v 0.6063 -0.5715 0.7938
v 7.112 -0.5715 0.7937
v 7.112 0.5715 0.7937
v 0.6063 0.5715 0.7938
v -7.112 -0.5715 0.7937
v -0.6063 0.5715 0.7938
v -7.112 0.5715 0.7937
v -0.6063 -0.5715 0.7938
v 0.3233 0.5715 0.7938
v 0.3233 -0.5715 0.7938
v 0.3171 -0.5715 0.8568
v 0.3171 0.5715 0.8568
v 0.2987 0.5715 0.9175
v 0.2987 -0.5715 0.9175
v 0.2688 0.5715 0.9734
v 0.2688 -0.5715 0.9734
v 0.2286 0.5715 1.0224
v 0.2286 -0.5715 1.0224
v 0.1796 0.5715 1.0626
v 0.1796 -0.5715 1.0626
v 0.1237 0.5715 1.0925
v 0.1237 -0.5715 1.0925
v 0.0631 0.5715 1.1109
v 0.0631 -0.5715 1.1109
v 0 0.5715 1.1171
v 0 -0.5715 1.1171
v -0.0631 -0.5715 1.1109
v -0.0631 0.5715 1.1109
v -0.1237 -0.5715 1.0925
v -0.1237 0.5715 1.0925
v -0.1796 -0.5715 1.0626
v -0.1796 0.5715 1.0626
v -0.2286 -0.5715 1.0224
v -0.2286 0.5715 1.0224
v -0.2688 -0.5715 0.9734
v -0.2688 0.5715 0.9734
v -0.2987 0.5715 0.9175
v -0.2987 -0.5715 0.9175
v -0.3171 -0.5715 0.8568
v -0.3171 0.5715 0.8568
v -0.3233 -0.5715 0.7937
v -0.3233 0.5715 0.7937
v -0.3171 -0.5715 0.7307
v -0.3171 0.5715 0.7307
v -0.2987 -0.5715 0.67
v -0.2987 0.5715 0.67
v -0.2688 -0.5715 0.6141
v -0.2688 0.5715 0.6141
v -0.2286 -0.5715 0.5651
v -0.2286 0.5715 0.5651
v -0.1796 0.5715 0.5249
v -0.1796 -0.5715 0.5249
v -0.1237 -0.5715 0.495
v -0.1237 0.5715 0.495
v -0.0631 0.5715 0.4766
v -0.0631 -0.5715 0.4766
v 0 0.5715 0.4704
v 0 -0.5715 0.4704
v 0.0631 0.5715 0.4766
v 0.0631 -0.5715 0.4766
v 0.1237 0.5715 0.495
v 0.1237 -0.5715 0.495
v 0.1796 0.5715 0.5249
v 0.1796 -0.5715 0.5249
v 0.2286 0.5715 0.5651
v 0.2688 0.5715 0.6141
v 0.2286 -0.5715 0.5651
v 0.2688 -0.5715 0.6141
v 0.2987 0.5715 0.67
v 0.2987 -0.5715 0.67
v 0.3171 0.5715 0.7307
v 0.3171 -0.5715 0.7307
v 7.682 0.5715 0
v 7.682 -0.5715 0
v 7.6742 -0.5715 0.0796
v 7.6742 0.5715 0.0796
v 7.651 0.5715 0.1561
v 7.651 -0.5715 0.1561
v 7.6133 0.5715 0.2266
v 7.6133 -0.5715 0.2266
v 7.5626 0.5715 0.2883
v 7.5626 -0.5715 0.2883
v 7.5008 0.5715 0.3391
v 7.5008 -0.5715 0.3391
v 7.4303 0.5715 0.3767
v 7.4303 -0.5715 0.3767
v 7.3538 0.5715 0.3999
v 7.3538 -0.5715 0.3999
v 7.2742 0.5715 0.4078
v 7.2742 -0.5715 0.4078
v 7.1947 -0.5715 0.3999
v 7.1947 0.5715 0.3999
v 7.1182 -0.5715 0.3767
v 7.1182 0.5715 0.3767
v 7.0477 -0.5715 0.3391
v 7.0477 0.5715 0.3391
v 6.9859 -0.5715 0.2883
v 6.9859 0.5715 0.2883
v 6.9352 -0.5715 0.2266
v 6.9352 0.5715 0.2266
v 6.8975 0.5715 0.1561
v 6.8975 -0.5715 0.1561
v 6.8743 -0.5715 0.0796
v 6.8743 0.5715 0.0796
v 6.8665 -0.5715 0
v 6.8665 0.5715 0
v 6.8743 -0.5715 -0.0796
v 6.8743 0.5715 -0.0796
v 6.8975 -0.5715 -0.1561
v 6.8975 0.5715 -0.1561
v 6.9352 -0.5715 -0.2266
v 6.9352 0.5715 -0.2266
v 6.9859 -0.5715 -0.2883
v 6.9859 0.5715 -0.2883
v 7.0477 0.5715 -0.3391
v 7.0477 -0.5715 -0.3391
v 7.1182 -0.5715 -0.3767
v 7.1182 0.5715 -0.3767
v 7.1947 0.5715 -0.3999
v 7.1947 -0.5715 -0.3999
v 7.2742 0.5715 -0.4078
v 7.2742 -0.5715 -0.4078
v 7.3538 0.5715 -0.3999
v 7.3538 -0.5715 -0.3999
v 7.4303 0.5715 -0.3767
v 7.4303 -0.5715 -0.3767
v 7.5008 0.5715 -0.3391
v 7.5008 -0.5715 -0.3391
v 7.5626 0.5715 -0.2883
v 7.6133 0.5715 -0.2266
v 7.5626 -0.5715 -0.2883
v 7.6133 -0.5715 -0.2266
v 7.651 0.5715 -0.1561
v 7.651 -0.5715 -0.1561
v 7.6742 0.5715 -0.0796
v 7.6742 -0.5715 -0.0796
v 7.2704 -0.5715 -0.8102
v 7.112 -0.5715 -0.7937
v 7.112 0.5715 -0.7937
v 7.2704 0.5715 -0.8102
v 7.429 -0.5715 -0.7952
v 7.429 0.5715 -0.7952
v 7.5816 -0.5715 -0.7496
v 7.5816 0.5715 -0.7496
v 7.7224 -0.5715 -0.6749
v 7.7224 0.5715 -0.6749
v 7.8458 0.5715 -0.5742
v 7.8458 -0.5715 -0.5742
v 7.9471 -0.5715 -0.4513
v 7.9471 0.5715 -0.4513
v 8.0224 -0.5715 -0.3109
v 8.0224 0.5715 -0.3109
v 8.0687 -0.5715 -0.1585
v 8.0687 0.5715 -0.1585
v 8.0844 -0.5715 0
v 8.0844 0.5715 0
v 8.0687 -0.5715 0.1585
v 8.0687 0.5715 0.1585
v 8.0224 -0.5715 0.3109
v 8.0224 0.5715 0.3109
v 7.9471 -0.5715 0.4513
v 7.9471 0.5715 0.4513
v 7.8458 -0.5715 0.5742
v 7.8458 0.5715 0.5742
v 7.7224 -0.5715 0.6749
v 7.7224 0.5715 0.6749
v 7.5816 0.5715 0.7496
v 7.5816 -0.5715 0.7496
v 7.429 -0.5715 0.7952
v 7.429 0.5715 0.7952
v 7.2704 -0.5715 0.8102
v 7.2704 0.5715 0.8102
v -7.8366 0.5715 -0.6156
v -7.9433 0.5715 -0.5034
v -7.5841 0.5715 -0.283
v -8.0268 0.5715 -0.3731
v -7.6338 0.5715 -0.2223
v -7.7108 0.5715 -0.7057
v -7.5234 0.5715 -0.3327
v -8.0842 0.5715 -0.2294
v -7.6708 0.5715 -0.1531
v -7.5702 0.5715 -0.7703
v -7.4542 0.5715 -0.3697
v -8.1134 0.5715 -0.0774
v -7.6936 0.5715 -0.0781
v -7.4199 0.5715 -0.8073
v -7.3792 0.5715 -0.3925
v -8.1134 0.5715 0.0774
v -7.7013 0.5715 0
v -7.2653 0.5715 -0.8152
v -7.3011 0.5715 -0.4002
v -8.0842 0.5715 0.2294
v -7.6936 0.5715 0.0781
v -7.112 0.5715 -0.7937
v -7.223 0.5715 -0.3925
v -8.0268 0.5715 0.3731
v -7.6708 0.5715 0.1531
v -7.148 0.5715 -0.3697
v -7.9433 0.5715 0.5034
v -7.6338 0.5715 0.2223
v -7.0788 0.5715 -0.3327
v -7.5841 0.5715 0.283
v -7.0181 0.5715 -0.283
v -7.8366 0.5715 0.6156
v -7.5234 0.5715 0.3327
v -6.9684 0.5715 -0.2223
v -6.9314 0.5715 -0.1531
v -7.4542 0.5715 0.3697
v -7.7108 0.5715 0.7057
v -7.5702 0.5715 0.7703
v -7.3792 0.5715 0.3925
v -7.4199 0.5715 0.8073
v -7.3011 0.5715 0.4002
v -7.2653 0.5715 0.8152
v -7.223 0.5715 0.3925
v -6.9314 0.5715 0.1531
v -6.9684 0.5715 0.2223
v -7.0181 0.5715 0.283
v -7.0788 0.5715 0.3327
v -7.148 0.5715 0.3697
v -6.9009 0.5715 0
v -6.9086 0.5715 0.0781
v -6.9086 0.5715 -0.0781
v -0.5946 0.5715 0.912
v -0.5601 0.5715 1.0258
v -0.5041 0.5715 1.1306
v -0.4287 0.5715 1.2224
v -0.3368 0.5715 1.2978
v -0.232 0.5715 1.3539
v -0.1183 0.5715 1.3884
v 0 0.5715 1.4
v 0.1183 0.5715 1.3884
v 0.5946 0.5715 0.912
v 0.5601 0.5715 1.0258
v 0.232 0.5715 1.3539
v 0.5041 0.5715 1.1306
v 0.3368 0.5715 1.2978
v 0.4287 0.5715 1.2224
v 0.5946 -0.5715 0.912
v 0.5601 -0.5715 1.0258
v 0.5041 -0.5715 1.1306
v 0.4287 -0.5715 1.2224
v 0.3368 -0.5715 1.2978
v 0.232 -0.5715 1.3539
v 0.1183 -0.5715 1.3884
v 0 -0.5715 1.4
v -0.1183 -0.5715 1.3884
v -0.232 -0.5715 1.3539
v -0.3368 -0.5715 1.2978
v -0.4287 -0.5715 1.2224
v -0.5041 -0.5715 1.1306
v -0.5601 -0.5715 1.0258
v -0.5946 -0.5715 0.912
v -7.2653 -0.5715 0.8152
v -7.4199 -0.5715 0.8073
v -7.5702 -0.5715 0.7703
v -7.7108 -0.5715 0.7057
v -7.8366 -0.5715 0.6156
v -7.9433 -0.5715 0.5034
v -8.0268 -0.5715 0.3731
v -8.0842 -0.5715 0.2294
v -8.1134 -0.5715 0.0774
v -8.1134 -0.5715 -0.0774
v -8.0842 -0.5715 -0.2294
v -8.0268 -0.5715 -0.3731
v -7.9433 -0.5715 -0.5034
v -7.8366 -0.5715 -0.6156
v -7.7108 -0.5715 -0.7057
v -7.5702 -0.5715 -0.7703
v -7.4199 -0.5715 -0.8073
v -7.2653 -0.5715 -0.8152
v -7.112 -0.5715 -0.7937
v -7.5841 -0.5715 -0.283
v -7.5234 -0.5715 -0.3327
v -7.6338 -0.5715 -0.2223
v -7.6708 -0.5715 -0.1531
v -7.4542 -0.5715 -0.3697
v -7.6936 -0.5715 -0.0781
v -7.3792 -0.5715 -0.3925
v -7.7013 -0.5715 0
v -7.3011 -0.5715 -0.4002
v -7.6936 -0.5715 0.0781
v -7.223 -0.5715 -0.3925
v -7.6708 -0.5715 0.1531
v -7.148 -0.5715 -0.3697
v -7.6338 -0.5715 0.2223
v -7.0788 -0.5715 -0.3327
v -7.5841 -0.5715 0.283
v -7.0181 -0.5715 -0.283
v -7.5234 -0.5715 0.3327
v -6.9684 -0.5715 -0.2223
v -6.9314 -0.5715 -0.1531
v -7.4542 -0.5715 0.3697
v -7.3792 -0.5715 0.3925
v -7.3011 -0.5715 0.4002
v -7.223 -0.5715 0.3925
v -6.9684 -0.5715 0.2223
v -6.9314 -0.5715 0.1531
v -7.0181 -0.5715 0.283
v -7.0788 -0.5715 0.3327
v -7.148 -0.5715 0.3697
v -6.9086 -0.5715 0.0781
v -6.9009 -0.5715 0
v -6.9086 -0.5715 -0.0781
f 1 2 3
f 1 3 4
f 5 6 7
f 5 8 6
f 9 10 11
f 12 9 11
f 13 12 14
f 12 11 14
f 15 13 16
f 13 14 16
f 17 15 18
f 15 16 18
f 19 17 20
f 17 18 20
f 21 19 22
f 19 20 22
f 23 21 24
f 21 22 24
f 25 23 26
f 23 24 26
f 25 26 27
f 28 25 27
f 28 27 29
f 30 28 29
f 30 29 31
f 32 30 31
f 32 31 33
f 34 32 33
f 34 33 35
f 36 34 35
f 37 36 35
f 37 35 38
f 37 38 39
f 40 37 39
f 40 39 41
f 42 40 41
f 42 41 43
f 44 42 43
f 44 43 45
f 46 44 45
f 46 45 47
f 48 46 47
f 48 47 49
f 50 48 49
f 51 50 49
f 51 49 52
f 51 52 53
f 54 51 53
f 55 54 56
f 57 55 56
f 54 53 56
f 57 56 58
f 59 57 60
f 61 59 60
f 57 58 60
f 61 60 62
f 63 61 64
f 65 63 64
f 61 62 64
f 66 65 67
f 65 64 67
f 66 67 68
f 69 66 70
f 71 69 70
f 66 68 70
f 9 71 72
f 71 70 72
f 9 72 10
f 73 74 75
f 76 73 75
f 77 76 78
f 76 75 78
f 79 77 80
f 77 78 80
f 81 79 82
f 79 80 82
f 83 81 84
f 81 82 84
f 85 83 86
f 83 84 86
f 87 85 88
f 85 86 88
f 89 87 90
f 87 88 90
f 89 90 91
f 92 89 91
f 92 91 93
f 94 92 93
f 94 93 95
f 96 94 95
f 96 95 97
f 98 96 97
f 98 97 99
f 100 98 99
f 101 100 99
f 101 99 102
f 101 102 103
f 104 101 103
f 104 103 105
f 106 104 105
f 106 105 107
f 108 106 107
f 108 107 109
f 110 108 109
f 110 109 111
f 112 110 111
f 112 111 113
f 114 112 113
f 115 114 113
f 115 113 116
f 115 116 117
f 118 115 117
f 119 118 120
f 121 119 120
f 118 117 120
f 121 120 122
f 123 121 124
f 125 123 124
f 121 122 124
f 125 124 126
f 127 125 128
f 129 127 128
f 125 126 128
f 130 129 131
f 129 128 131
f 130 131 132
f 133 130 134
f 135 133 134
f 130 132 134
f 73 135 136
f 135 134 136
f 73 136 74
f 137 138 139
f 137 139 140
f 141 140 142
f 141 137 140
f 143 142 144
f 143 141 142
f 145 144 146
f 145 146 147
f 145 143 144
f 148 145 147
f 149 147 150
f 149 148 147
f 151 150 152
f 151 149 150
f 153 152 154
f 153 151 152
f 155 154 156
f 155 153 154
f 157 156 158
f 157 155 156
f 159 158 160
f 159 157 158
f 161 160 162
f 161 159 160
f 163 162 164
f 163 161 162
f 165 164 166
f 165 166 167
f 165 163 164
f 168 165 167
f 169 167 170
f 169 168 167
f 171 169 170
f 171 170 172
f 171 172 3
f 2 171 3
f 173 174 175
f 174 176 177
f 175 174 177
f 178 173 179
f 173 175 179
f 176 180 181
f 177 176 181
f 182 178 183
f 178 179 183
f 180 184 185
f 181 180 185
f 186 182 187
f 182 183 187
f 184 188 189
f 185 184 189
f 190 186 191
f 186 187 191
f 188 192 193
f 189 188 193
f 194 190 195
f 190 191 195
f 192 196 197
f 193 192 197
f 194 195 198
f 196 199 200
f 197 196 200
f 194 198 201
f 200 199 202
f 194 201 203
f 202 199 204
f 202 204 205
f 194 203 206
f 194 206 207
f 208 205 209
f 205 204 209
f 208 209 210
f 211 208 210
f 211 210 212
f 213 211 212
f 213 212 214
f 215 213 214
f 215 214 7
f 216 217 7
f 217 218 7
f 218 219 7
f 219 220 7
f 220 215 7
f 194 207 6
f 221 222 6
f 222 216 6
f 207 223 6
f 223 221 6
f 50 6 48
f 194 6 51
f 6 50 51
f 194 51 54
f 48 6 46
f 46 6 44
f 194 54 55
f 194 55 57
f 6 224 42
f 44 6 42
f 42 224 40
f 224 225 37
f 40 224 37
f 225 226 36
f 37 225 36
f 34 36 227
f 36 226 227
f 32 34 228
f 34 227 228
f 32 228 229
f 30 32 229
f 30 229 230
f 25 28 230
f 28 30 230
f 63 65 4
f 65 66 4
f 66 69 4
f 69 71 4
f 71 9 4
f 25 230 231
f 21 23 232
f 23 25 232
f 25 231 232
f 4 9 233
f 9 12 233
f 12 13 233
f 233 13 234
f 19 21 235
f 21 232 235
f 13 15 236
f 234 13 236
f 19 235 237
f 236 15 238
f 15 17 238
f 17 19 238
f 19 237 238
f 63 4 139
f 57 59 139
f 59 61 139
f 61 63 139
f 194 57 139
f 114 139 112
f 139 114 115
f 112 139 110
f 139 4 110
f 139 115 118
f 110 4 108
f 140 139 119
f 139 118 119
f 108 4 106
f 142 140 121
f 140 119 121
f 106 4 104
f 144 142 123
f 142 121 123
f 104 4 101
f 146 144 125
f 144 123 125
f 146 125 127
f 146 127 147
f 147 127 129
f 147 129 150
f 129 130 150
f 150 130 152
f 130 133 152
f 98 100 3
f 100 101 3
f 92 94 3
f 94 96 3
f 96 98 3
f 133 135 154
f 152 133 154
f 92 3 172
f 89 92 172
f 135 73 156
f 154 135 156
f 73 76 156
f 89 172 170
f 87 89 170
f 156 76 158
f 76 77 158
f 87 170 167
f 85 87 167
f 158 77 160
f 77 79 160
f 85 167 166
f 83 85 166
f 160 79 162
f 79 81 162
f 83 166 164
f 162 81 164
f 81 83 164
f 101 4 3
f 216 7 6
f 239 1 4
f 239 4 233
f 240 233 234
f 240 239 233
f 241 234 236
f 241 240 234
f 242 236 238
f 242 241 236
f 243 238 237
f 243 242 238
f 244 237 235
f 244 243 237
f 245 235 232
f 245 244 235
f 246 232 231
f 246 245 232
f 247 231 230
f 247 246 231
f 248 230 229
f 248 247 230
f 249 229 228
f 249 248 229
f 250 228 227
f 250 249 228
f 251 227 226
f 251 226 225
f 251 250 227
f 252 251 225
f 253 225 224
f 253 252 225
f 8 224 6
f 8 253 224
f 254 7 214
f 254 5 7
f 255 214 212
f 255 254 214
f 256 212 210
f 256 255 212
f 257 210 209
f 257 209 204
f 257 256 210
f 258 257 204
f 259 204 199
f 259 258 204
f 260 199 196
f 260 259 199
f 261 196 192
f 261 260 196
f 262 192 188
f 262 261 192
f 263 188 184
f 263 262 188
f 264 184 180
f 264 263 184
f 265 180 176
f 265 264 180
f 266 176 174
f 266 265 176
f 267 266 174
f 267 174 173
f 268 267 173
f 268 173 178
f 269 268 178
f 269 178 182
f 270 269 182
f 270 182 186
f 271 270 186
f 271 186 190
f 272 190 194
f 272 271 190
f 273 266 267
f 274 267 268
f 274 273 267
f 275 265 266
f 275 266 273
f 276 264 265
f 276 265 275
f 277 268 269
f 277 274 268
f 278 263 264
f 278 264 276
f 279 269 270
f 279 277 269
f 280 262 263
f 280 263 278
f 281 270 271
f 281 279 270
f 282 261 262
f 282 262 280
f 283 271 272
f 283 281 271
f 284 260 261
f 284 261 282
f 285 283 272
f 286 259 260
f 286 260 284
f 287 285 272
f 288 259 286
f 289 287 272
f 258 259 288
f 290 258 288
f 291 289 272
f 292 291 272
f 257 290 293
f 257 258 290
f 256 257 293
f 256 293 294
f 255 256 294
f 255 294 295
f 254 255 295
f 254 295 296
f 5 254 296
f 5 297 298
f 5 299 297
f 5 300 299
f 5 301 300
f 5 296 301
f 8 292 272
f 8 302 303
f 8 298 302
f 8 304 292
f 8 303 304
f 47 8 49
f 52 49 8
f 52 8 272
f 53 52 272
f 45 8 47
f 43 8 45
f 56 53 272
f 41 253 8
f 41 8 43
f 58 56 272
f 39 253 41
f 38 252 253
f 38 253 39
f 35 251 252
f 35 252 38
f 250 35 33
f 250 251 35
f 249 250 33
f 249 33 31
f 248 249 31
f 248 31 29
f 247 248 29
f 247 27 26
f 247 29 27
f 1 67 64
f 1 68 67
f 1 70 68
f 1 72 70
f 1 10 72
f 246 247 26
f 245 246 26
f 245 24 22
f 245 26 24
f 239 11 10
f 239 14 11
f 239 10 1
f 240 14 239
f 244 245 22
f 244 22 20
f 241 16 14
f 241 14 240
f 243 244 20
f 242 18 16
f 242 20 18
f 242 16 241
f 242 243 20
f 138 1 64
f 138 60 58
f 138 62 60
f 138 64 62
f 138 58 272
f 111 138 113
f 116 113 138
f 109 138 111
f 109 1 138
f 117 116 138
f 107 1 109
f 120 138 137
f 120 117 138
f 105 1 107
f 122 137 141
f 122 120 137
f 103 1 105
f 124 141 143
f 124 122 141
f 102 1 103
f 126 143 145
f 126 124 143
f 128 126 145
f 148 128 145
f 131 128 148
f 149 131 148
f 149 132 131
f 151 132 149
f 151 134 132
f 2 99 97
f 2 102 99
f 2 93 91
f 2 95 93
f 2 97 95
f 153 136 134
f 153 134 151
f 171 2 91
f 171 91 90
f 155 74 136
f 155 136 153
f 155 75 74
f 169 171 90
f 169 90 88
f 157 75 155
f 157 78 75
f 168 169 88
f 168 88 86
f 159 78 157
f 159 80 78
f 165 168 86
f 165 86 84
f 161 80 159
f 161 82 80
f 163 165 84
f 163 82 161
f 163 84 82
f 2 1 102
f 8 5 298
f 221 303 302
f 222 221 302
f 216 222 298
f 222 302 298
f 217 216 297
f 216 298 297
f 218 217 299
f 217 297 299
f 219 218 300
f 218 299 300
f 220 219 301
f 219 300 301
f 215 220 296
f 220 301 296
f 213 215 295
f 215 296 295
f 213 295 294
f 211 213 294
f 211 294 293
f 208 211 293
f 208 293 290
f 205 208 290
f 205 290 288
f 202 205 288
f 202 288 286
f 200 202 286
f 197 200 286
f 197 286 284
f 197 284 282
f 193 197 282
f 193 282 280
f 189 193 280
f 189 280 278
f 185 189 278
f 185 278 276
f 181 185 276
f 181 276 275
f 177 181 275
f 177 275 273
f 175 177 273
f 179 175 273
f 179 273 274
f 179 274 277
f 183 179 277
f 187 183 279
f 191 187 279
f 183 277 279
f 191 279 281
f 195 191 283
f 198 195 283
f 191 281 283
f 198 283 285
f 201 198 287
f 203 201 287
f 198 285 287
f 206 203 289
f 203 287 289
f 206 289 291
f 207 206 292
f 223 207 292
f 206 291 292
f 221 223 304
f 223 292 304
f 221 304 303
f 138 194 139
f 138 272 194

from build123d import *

# Parameters (mm, degrees)
F1_DEPTH = 0.5715
F2_R     = 0.400182
F2_R_2   = 0.323313
F2_R_3   = 0.40778
F3_DEPTH = 25.4


with BuildPart() as f1:
    # F0 (on Front) → F1 (new body, symmetric)
    with BuildSketch(Plane.XZ):
        Polygon((-7.112, 0.79375), (-7.112, -0.79375), (7.112, -0.79375), (7.112, 0.79375), (0.60626, 0.79375), (-0.60626, 0.79375), align=None)
        with BuildLine():
            ThreePointArc((-7.112, 0.79375), (-8.11707, 0), (-7.112, -0.79375))
            Line((-7.112, -0.79375), (-7.112, 0.79375))
        make_face()
        with BuildLine():
            Line((7.112, 0.79375), (7.112, -0.79375))
            ThreePointArc((7.112, -0.79375), (8.084401, 0), (7.112, 0.79375))
        make_face()
        with BuildLine():
            ThreePointArc((0.60626, 0.79375), (0, 1.40001), (-0.60626, 0.79375))
            Line((-0.60626, 0.79375), (0.60626, 0.79375))
        make_face()
    extrude(amount=F1_DEPTH, both=True)

    # F2 (on face) → F3 (cut)
    with BuildSketch(Plane.XZ.offset(0.5715)):
        with Locations((-7.301104, 0)):
            Circle(F2_R)
        with Locations((0, 0.79375)):
            Circle(F2_R_2)
        with Locations((7.27424, 0)):
            Circle(F2_R_3)
    extrude(amount=-F3_DEPTH, mode=Mode.SUBTRACT)


solid = f1.part
